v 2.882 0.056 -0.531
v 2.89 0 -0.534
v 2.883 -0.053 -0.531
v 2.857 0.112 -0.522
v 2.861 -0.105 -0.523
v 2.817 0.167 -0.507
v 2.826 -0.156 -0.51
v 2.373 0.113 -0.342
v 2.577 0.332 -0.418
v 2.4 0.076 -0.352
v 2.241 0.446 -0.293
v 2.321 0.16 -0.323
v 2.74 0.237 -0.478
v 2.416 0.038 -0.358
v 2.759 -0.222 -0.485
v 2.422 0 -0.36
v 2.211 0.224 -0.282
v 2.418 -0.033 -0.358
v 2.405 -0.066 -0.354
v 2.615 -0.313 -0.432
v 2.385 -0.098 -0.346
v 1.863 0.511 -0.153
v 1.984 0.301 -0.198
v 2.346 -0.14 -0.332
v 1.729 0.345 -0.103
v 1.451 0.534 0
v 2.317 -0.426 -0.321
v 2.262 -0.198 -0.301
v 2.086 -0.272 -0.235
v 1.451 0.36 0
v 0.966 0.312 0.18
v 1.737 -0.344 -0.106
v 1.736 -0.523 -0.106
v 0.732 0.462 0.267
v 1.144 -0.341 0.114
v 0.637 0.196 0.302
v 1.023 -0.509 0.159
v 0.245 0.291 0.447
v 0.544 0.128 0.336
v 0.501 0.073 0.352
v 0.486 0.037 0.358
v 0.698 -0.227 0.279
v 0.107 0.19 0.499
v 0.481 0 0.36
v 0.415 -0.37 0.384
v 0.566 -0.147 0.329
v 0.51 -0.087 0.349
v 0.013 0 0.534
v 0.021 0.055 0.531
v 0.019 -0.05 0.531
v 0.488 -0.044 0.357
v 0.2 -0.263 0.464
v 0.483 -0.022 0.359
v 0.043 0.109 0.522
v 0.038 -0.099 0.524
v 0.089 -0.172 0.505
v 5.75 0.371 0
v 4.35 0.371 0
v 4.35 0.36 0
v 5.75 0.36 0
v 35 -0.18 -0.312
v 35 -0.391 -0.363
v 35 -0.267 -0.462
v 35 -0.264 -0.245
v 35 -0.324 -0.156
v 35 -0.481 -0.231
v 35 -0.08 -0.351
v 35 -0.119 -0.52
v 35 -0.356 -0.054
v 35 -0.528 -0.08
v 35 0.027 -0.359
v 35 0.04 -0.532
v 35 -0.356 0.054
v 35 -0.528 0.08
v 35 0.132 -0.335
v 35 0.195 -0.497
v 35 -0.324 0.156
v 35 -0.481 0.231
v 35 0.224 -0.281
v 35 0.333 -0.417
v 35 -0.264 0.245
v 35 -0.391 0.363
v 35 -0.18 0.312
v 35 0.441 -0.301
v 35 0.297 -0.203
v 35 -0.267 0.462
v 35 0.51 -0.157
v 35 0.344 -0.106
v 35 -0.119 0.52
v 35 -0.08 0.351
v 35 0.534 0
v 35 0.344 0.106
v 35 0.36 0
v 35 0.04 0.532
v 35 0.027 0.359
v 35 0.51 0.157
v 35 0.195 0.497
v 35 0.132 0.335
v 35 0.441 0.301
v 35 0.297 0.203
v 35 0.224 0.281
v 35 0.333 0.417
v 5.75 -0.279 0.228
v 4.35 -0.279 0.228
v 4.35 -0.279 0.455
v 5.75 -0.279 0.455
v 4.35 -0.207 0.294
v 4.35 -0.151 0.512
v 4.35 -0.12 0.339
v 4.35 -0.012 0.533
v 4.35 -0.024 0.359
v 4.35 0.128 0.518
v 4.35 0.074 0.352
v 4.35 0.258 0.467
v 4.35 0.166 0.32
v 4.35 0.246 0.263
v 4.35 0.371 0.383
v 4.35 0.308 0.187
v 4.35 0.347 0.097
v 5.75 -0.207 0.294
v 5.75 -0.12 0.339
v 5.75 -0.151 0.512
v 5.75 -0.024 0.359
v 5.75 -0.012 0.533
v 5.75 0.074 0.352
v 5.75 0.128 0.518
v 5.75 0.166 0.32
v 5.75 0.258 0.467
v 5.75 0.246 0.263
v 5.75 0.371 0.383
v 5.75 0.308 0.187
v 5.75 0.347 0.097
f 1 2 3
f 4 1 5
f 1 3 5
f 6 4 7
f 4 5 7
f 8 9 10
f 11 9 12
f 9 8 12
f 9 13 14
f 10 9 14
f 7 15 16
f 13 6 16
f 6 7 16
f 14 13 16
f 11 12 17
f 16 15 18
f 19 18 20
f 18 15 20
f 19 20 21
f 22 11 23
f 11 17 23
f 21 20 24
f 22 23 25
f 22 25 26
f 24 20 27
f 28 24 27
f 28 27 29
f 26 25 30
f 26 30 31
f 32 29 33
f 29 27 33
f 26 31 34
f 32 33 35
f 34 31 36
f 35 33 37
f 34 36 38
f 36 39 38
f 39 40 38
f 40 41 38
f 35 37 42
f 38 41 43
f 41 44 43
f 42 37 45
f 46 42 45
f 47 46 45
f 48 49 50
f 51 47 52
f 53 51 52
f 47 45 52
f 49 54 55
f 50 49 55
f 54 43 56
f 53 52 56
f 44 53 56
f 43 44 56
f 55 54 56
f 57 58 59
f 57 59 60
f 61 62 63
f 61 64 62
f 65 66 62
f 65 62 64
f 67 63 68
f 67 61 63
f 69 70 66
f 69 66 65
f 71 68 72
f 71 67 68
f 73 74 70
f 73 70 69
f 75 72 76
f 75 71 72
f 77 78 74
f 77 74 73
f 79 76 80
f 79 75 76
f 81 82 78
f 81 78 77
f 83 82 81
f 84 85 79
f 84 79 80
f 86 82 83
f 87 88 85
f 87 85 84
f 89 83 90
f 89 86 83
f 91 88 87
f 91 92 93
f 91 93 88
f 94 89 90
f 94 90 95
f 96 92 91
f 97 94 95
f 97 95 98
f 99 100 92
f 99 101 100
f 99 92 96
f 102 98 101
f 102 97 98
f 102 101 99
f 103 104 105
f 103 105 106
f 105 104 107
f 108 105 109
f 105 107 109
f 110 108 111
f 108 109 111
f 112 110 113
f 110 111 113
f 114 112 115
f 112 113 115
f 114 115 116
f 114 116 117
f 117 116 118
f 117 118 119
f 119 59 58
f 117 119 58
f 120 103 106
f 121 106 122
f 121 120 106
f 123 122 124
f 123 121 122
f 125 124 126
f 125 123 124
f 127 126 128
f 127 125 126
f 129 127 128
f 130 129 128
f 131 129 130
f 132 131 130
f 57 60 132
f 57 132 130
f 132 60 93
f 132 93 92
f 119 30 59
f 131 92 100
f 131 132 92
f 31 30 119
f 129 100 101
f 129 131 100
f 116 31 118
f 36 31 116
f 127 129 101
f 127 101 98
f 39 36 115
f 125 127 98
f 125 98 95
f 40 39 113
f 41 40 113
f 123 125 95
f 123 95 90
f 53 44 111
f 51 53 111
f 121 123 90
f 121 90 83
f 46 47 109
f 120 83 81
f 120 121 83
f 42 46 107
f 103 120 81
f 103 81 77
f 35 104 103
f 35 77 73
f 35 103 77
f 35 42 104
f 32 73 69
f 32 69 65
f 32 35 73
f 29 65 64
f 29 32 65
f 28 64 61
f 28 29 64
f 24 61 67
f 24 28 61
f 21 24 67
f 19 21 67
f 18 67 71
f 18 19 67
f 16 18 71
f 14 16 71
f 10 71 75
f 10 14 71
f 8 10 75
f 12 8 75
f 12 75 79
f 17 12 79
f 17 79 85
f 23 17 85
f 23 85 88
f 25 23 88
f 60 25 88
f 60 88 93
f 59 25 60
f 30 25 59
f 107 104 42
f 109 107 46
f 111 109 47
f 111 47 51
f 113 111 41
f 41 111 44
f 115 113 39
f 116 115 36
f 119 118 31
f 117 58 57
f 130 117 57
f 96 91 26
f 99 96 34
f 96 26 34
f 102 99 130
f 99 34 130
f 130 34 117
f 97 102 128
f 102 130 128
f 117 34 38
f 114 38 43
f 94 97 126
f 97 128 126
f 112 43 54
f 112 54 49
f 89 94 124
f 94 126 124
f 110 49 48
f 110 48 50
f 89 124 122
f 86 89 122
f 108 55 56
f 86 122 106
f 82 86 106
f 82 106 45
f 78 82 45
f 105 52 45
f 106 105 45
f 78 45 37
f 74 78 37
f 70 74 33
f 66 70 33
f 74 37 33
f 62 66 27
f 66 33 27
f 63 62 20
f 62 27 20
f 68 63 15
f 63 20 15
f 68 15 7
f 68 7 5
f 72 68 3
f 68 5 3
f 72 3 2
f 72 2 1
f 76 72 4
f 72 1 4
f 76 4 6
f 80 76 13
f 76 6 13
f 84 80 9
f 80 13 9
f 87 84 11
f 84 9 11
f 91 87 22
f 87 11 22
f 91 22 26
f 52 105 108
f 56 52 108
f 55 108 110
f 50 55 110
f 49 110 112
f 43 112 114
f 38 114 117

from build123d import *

# Parameters (mm, degrees)
F0_R     = 0.5335
F0_R_2   = 0.36
F1_DEPTH = 35
F3_DEPTH = 0.5345
F4_DEPTH = 0.5345
F5_W     = 1.4
F5_H     = 0.65
F6_DEPTH = 1


with BuildPart() as f1:
    # F0 (on Right) → F1 (new body)
    with BuildSketch(Plane.YZ):
        Circle(F0_R)
        Circle(F0_R_2, mode=Mode.SUBTRACT)
    extrude(amount=F1_DEPTH)

    # F2 (on Front) → F3 (cut, through all)
    with BuildSketch(Plane.XZ):
        Polygon((3, -0.574455), (0, 0.53833), (0, -0.574455), align=None)
    extrude(amount=-F3_DEPTH, mode=Mode.SUBTRACT)

    # F2 (on Front) → F4 (cut, through all)
    with BuildSketch(Plane.XZ):
        Polygon((3, -0.574455), (0, 0.53833), (0, -0.574455), align=None)
    extrude(amount=F4_DEPTH, mode=Mode.SUBTRACT)

    # F5 (on Top) → F6 (cut)
    with BuildSketch(Plane.XY):
        with Locations((5.05, 0.046142)):
            Rectangle(F5_W, F5_H)
    extrude(amount=F6_DEPTH, mode=Mode.SUBTRACT)


solid = f1.part
